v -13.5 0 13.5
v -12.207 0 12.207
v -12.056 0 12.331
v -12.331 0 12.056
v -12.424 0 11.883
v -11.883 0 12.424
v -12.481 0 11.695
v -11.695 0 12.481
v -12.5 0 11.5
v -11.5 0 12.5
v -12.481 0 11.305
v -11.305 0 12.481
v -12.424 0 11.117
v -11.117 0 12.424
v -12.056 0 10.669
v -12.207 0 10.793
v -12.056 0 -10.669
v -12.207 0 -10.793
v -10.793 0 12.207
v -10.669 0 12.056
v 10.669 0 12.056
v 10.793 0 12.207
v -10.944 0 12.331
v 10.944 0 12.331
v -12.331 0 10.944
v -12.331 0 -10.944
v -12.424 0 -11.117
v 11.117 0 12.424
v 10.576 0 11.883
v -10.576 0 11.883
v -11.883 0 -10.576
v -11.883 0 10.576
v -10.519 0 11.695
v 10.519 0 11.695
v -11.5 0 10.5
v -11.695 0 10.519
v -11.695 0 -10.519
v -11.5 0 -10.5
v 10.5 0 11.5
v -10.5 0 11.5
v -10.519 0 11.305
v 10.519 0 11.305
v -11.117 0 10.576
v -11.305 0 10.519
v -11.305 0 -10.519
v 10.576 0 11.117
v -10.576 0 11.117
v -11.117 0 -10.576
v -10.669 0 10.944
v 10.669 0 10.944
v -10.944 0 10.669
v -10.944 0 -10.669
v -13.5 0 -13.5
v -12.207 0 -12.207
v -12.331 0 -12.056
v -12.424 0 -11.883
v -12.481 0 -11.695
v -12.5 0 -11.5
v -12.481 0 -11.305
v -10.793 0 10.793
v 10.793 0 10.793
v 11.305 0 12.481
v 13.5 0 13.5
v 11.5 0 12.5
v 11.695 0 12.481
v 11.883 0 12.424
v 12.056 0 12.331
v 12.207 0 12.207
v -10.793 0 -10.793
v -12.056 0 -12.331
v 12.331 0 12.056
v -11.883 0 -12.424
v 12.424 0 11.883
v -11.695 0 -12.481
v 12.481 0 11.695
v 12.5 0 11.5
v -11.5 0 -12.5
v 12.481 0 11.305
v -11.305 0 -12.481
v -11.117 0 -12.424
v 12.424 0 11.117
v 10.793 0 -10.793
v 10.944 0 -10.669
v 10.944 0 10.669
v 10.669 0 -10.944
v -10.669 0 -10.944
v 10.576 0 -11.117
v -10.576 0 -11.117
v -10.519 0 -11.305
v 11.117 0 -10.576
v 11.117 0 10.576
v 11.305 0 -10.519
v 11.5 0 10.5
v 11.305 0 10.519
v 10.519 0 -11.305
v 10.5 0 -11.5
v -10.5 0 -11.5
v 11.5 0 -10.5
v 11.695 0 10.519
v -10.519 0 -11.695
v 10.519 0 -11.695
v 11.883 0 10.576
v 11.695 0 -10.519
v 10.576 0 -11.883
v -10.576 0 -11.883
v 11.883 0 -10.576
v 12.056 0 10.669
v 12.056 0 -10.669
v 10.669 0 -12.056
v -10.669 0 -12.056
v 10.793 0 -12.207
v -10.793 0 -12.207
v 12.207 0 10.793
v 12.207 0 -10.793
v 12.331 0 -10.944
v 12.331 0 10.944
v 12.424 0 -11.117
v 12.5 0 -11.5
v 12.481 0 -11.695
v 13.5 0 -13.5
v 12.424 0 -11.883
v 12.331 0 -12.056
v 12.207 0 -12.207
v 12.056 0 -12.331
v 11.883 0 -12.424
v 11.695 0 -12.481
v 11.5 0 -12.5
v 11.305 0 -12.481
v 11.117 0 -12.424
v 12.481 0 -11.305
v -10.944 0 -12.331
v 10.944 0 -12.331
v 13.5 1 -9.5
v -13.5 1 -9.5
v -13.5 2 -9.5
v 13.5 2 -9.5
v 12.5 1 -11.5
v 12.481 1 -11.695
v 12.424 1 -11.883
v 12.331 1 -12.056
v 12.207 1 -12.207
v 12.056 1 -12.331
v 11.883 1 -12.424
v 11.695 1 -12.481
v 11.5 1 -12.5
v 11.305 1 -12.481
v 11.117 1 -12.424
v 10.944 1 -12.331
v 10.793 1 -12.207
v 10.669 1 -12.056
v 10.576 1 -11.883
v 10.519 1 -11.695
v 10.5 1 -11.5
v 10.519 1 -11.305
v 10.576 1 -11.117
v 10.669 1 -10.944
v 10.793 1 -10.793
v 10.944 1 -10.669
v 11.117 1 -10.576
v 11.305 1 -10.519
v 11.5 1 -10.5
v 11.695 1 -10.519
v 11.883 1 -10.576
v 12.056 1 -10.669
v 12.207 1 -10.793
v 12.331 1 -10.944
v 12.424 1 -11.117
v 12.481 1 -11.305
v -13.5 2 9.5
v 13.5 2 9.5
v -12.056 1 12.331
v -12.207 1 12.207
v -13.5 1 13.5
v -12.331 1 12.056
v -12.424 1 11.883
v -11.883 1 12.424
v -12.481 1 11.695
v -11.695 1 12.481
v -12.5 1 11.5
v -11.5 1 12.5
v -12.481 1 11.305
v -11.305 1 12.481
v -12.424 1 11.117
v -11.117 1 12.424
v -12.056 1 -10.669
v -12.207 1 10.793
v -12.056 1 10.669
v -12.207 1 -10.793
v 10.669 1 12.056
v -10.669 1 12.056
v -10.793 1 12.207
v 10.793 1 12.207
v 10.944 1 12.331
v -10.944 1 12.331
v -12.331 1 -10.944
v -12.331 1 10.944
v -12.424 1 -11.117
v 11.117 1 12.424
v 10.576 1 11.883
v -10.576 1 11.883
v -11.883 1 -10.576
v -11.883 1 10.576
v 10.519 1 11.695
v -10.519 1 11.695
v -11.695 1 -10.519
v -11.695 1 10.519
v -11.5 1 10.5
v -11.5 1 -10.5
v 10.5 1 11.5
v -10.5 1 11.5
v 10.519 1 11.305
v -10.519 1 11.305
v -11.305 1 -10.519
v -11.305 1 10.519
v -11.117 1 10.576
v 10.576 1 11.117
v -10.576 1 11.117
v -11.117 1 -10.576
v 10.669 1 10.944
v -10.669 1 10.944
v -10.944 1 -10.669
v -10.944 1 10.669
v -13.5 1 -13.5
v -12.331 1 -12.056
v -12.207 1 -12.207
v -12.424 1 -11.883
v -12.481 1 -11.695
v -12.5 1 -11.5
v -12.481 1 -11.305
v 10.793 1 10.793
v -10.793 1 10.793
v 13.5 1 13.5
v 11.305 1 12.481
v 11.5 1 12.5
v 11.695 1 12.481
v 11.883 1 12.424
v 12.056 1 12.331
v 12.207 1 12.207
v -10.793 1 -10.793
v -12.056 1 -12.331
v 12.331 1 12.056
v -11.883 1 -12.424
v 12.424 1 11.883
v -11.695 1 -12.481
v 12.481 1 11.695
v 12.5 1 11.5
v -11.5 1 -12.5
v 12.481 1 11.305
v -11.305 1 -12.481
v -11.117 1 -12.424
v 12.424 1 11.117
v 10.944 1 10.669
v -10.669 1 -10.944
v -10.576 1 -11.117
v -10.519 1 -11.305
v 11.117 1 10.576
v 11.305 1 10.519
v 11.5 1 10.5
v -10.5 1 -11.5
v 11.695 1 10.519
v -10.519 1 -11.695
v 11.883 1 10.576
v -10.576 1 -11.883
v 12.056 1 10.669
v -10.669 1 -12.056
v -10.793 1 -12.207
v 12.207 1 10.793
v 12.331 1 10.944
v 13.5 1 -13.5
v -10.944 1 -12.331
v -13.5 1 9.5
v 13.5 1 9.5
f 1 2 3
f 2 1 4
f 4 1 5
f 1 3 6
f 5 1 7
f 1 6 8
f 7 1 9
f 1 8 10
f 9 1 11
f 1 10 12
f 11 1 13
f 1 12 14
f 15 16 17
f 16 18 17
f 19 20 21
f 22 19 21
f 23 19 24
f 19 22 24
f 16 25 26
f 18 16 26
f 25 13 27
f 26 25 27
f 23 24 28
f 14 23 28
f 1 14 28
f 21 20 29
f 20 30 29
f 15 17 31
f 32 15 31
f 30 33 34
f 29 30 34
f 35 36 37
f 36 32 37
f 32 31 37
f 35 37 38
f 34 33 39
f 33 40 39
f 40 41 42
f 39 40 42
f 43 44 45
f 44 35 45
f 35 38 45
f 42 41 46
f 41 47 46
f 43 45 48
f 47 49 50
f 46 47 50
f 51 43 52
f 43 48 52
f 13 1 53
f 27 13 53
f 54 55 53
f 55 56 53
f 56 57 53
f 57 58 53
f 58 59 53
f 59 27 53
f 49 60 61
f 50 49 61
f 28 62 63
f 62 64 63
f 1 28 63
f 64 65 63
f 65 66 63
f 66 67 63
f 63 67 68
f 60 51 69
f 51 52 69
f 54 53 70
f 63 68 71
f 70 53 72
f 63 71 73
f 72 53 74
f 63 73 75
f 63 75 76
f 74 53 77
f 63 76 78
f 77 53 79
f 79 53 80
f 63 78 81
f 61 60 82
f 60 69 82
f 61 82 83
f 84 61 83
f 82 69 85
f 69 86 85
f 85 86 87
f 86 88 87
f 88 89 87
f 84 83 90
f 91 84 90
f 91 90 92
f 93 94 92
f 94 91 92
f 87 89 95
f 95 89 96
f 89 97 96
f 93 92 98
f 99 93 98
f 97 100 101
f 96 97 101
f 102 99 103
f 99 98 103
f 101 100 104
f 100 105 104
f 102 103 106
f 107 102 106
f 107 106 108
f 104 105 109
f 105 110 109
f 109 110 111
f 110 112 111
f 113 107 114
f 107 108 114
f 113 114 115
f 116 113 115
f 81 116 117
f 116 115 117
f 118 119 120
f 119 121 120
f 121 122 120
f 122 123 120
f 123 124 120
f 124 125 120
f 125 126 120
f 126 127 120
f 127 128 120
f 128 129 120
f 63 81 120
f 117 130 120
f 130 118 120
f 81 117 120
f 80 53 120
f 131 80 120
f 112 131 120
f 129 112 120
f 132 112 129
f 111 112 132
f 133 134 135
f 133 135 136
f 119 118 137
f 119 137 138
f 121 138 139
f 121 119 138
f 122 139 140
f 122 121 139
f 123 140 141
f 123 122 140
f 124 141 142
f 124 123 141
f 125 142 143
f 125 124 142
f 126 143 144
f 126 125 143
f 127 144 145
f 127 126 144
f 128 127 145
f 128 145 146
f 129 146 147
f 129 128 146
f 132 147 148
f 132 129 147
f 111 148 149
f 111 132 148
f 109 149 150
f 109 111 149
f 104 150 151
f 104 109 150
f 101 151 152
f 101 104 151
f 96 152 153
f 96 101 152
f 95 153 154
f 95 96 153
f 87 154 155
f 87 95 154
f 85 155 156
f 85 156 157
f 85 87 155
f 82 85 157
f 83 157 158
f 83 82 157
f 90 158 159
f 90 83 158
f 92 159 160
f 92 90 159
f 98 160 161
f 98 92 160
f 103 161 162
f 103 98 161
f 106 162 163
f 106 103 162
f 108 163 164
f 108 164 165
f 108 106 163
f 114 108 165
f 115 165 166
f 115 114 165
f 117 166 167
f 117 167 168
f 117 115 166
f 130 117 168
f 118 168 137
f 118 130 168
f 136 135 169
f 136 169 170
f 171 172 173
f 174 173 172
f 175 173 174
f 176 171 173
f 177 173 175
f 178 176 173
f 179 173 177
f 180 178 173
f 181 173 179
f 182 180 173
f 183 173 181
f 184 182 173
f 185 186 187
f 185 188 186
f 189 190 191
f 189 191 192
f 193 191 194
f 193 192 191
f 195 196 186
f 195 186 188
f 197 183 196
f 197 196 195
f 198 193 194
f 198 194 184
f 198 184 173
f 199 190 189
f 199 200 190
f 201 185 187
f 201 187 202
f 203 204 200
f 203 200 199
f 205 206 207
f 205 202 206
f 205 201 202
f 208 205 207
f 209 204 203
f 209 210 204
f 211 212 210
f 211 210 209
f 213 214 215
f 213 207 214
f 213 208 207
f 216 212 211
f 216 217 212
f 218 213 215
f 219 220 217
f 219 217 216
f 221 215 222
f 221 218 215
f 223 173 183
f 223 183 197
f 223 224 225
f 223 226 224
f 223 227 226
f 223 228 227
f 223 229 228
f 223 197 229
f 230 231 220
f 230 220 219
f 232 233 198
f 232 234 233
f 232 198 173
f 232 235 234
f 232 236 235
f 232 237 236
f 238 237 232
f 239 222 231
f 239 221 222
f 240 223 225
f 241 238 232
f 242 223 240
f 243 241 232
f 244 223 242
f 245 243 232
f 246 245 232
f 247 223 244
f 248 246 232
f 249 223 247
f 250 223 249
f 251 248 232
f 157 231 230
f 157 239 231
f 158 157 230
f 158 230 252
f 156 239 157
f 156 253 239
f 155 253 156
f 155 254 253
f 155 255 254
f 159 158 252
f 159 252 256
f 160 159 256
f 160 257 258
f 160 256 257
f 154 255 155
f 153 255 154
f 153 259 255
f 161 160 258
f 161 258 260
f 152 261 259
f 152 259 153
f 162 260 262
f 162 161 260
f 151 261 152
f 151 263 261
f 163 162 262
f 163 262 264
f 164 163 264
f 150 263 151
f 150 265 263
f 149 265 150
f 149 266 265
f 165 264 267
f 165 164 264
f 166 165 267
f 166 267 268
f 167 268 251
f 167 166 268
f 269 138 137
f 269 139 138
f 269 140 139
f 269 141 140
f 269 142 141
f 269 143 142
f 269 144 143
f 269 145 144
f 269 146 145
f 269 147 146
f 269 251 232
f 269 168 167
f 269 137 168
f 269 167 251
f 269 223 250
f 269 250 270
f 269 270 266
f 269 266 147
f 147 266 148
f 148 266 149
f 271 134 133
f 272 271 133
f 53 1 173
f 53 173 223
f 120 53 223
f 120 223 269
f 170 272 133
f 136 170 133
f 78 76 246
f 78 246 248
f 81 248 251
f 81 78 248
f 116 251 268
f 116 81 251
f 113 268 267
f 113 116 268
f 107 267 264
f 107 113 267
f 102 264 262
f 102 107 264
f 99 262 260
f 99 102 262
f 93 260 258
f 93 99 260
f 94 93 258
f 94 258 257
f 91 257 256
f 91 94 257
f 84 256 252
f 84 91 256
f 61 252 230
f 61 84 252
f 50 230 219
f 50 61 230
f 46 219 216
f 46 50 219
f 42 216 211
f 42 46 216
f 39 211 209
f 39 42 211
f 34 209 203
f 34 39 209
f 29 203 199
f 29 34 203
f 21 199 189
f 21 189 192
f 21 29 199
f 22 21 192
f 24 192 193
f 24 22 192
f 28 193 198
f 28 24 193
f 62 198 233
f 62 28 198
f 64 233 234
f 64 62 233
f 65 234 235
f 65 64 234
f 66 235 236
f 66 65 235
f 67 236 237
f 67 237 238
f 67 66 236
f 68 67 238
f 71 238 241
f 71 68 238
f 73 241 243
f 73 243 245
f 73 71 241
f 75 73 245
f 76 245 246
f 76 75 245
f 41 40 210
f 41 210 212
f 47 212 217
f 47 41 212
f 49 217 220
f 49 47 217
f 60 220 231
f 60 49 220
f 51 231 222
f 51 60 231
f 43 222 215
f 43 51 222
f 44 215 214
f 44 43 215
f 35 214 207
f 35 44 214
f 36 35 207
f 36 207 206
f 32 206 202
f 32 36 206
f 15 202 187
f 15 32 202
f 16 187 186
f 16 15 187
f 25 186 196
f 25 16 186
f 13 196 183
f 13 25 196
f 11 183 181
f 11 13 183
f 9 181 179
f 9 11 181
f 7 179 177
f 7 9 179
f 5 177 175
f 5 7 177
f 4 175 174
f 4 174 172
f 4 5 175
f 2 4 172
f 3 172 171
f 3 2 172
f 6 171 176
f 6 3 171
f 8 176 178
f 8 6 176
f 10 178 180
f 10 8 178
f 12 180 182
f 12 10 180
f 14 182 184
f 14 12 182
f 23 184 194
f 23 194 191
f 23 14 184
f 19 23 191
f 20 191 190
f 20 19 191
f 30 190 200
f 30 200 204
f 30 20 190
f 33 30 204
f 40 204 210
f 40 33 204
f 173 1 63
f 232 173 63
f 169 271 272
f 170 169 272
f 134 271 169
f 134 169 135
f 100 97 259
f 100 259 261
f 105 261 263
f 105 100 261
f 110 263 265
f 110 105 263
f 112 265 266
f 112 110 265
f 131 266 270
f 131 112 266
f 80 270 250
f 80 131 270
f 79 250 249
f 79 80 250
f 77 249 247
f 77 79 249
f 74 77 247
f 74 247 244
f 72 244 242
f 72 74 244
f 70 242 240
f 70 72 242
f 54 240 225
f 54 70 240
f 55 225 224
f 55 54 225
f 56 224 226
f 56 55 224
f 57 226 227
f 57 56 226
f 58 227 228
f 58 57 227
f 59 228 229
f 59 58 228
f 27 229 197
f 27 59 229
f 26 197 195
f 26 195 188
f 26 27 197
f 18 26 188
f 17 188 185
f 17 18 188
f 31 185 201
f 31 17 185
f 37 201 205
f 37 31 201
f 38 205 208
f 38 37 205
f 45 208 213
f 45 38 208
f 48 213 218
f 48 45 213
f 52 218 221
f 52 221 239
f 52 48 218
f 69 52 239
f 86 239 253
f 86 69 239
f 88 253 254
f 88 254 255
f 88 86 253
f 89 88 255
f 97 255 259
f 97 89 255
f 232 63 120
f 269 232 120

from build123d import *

# Parameters (mm, degrees)
SKETCH1_W           = 27
SKETCH1_H           = 27
SKETCH1_R           = 1
BOSS_EXTRUDE1_DEPTH = 1
SKETCH2_W           = 27
SKETCH2_H           = 19
BOSS_EXTRUDE2_DEPTH = 1


with BuildPart() as part:
    # Sketch1 → Boss-Extrude1 (new body)
    with BuildSketch(Plane(origin=(0, 0, 0), x_dir=(1, 0, 0), z_dir=(0, 1, 0))):
        Rectangle(SKETCH1_W, SKETCH1_H)
        with Locations((-11.5, 11.5)):
            Circle(SKETCH1_R, mode=Mode.SUBTRACT)
        with Locations((11.5, 11.5)):
            Circle(SKETCH1_R, mode=Mode.SUBTRACT)
        with Locations((11.5, -11.5)):
            Circle(SKETCH1_R, mode=Mode.SUBTRACT)
        with Locations((-11.5, -11.5)):
            Circle(SKETCH1_R, mode=Mode.SUBTRACT)
    extrude(amount=BOSS_EXTRUDE1_DEPTH)


with BuildPart() as body_2:
    # Sketch2 → Boss-Extrude2 (new body)
    with BuildSketch(Plane(origin=(0, 1, 0), x_dir=(1, 0, 0), z_dir=(0, 1, 0))):
        Rectangle(SKETCH2_W, SKETCH2_H)
    extrude(amount=BOSS_EXTRUDE2_DEPTH)


solid = Compound([part.part, body_2.part])
